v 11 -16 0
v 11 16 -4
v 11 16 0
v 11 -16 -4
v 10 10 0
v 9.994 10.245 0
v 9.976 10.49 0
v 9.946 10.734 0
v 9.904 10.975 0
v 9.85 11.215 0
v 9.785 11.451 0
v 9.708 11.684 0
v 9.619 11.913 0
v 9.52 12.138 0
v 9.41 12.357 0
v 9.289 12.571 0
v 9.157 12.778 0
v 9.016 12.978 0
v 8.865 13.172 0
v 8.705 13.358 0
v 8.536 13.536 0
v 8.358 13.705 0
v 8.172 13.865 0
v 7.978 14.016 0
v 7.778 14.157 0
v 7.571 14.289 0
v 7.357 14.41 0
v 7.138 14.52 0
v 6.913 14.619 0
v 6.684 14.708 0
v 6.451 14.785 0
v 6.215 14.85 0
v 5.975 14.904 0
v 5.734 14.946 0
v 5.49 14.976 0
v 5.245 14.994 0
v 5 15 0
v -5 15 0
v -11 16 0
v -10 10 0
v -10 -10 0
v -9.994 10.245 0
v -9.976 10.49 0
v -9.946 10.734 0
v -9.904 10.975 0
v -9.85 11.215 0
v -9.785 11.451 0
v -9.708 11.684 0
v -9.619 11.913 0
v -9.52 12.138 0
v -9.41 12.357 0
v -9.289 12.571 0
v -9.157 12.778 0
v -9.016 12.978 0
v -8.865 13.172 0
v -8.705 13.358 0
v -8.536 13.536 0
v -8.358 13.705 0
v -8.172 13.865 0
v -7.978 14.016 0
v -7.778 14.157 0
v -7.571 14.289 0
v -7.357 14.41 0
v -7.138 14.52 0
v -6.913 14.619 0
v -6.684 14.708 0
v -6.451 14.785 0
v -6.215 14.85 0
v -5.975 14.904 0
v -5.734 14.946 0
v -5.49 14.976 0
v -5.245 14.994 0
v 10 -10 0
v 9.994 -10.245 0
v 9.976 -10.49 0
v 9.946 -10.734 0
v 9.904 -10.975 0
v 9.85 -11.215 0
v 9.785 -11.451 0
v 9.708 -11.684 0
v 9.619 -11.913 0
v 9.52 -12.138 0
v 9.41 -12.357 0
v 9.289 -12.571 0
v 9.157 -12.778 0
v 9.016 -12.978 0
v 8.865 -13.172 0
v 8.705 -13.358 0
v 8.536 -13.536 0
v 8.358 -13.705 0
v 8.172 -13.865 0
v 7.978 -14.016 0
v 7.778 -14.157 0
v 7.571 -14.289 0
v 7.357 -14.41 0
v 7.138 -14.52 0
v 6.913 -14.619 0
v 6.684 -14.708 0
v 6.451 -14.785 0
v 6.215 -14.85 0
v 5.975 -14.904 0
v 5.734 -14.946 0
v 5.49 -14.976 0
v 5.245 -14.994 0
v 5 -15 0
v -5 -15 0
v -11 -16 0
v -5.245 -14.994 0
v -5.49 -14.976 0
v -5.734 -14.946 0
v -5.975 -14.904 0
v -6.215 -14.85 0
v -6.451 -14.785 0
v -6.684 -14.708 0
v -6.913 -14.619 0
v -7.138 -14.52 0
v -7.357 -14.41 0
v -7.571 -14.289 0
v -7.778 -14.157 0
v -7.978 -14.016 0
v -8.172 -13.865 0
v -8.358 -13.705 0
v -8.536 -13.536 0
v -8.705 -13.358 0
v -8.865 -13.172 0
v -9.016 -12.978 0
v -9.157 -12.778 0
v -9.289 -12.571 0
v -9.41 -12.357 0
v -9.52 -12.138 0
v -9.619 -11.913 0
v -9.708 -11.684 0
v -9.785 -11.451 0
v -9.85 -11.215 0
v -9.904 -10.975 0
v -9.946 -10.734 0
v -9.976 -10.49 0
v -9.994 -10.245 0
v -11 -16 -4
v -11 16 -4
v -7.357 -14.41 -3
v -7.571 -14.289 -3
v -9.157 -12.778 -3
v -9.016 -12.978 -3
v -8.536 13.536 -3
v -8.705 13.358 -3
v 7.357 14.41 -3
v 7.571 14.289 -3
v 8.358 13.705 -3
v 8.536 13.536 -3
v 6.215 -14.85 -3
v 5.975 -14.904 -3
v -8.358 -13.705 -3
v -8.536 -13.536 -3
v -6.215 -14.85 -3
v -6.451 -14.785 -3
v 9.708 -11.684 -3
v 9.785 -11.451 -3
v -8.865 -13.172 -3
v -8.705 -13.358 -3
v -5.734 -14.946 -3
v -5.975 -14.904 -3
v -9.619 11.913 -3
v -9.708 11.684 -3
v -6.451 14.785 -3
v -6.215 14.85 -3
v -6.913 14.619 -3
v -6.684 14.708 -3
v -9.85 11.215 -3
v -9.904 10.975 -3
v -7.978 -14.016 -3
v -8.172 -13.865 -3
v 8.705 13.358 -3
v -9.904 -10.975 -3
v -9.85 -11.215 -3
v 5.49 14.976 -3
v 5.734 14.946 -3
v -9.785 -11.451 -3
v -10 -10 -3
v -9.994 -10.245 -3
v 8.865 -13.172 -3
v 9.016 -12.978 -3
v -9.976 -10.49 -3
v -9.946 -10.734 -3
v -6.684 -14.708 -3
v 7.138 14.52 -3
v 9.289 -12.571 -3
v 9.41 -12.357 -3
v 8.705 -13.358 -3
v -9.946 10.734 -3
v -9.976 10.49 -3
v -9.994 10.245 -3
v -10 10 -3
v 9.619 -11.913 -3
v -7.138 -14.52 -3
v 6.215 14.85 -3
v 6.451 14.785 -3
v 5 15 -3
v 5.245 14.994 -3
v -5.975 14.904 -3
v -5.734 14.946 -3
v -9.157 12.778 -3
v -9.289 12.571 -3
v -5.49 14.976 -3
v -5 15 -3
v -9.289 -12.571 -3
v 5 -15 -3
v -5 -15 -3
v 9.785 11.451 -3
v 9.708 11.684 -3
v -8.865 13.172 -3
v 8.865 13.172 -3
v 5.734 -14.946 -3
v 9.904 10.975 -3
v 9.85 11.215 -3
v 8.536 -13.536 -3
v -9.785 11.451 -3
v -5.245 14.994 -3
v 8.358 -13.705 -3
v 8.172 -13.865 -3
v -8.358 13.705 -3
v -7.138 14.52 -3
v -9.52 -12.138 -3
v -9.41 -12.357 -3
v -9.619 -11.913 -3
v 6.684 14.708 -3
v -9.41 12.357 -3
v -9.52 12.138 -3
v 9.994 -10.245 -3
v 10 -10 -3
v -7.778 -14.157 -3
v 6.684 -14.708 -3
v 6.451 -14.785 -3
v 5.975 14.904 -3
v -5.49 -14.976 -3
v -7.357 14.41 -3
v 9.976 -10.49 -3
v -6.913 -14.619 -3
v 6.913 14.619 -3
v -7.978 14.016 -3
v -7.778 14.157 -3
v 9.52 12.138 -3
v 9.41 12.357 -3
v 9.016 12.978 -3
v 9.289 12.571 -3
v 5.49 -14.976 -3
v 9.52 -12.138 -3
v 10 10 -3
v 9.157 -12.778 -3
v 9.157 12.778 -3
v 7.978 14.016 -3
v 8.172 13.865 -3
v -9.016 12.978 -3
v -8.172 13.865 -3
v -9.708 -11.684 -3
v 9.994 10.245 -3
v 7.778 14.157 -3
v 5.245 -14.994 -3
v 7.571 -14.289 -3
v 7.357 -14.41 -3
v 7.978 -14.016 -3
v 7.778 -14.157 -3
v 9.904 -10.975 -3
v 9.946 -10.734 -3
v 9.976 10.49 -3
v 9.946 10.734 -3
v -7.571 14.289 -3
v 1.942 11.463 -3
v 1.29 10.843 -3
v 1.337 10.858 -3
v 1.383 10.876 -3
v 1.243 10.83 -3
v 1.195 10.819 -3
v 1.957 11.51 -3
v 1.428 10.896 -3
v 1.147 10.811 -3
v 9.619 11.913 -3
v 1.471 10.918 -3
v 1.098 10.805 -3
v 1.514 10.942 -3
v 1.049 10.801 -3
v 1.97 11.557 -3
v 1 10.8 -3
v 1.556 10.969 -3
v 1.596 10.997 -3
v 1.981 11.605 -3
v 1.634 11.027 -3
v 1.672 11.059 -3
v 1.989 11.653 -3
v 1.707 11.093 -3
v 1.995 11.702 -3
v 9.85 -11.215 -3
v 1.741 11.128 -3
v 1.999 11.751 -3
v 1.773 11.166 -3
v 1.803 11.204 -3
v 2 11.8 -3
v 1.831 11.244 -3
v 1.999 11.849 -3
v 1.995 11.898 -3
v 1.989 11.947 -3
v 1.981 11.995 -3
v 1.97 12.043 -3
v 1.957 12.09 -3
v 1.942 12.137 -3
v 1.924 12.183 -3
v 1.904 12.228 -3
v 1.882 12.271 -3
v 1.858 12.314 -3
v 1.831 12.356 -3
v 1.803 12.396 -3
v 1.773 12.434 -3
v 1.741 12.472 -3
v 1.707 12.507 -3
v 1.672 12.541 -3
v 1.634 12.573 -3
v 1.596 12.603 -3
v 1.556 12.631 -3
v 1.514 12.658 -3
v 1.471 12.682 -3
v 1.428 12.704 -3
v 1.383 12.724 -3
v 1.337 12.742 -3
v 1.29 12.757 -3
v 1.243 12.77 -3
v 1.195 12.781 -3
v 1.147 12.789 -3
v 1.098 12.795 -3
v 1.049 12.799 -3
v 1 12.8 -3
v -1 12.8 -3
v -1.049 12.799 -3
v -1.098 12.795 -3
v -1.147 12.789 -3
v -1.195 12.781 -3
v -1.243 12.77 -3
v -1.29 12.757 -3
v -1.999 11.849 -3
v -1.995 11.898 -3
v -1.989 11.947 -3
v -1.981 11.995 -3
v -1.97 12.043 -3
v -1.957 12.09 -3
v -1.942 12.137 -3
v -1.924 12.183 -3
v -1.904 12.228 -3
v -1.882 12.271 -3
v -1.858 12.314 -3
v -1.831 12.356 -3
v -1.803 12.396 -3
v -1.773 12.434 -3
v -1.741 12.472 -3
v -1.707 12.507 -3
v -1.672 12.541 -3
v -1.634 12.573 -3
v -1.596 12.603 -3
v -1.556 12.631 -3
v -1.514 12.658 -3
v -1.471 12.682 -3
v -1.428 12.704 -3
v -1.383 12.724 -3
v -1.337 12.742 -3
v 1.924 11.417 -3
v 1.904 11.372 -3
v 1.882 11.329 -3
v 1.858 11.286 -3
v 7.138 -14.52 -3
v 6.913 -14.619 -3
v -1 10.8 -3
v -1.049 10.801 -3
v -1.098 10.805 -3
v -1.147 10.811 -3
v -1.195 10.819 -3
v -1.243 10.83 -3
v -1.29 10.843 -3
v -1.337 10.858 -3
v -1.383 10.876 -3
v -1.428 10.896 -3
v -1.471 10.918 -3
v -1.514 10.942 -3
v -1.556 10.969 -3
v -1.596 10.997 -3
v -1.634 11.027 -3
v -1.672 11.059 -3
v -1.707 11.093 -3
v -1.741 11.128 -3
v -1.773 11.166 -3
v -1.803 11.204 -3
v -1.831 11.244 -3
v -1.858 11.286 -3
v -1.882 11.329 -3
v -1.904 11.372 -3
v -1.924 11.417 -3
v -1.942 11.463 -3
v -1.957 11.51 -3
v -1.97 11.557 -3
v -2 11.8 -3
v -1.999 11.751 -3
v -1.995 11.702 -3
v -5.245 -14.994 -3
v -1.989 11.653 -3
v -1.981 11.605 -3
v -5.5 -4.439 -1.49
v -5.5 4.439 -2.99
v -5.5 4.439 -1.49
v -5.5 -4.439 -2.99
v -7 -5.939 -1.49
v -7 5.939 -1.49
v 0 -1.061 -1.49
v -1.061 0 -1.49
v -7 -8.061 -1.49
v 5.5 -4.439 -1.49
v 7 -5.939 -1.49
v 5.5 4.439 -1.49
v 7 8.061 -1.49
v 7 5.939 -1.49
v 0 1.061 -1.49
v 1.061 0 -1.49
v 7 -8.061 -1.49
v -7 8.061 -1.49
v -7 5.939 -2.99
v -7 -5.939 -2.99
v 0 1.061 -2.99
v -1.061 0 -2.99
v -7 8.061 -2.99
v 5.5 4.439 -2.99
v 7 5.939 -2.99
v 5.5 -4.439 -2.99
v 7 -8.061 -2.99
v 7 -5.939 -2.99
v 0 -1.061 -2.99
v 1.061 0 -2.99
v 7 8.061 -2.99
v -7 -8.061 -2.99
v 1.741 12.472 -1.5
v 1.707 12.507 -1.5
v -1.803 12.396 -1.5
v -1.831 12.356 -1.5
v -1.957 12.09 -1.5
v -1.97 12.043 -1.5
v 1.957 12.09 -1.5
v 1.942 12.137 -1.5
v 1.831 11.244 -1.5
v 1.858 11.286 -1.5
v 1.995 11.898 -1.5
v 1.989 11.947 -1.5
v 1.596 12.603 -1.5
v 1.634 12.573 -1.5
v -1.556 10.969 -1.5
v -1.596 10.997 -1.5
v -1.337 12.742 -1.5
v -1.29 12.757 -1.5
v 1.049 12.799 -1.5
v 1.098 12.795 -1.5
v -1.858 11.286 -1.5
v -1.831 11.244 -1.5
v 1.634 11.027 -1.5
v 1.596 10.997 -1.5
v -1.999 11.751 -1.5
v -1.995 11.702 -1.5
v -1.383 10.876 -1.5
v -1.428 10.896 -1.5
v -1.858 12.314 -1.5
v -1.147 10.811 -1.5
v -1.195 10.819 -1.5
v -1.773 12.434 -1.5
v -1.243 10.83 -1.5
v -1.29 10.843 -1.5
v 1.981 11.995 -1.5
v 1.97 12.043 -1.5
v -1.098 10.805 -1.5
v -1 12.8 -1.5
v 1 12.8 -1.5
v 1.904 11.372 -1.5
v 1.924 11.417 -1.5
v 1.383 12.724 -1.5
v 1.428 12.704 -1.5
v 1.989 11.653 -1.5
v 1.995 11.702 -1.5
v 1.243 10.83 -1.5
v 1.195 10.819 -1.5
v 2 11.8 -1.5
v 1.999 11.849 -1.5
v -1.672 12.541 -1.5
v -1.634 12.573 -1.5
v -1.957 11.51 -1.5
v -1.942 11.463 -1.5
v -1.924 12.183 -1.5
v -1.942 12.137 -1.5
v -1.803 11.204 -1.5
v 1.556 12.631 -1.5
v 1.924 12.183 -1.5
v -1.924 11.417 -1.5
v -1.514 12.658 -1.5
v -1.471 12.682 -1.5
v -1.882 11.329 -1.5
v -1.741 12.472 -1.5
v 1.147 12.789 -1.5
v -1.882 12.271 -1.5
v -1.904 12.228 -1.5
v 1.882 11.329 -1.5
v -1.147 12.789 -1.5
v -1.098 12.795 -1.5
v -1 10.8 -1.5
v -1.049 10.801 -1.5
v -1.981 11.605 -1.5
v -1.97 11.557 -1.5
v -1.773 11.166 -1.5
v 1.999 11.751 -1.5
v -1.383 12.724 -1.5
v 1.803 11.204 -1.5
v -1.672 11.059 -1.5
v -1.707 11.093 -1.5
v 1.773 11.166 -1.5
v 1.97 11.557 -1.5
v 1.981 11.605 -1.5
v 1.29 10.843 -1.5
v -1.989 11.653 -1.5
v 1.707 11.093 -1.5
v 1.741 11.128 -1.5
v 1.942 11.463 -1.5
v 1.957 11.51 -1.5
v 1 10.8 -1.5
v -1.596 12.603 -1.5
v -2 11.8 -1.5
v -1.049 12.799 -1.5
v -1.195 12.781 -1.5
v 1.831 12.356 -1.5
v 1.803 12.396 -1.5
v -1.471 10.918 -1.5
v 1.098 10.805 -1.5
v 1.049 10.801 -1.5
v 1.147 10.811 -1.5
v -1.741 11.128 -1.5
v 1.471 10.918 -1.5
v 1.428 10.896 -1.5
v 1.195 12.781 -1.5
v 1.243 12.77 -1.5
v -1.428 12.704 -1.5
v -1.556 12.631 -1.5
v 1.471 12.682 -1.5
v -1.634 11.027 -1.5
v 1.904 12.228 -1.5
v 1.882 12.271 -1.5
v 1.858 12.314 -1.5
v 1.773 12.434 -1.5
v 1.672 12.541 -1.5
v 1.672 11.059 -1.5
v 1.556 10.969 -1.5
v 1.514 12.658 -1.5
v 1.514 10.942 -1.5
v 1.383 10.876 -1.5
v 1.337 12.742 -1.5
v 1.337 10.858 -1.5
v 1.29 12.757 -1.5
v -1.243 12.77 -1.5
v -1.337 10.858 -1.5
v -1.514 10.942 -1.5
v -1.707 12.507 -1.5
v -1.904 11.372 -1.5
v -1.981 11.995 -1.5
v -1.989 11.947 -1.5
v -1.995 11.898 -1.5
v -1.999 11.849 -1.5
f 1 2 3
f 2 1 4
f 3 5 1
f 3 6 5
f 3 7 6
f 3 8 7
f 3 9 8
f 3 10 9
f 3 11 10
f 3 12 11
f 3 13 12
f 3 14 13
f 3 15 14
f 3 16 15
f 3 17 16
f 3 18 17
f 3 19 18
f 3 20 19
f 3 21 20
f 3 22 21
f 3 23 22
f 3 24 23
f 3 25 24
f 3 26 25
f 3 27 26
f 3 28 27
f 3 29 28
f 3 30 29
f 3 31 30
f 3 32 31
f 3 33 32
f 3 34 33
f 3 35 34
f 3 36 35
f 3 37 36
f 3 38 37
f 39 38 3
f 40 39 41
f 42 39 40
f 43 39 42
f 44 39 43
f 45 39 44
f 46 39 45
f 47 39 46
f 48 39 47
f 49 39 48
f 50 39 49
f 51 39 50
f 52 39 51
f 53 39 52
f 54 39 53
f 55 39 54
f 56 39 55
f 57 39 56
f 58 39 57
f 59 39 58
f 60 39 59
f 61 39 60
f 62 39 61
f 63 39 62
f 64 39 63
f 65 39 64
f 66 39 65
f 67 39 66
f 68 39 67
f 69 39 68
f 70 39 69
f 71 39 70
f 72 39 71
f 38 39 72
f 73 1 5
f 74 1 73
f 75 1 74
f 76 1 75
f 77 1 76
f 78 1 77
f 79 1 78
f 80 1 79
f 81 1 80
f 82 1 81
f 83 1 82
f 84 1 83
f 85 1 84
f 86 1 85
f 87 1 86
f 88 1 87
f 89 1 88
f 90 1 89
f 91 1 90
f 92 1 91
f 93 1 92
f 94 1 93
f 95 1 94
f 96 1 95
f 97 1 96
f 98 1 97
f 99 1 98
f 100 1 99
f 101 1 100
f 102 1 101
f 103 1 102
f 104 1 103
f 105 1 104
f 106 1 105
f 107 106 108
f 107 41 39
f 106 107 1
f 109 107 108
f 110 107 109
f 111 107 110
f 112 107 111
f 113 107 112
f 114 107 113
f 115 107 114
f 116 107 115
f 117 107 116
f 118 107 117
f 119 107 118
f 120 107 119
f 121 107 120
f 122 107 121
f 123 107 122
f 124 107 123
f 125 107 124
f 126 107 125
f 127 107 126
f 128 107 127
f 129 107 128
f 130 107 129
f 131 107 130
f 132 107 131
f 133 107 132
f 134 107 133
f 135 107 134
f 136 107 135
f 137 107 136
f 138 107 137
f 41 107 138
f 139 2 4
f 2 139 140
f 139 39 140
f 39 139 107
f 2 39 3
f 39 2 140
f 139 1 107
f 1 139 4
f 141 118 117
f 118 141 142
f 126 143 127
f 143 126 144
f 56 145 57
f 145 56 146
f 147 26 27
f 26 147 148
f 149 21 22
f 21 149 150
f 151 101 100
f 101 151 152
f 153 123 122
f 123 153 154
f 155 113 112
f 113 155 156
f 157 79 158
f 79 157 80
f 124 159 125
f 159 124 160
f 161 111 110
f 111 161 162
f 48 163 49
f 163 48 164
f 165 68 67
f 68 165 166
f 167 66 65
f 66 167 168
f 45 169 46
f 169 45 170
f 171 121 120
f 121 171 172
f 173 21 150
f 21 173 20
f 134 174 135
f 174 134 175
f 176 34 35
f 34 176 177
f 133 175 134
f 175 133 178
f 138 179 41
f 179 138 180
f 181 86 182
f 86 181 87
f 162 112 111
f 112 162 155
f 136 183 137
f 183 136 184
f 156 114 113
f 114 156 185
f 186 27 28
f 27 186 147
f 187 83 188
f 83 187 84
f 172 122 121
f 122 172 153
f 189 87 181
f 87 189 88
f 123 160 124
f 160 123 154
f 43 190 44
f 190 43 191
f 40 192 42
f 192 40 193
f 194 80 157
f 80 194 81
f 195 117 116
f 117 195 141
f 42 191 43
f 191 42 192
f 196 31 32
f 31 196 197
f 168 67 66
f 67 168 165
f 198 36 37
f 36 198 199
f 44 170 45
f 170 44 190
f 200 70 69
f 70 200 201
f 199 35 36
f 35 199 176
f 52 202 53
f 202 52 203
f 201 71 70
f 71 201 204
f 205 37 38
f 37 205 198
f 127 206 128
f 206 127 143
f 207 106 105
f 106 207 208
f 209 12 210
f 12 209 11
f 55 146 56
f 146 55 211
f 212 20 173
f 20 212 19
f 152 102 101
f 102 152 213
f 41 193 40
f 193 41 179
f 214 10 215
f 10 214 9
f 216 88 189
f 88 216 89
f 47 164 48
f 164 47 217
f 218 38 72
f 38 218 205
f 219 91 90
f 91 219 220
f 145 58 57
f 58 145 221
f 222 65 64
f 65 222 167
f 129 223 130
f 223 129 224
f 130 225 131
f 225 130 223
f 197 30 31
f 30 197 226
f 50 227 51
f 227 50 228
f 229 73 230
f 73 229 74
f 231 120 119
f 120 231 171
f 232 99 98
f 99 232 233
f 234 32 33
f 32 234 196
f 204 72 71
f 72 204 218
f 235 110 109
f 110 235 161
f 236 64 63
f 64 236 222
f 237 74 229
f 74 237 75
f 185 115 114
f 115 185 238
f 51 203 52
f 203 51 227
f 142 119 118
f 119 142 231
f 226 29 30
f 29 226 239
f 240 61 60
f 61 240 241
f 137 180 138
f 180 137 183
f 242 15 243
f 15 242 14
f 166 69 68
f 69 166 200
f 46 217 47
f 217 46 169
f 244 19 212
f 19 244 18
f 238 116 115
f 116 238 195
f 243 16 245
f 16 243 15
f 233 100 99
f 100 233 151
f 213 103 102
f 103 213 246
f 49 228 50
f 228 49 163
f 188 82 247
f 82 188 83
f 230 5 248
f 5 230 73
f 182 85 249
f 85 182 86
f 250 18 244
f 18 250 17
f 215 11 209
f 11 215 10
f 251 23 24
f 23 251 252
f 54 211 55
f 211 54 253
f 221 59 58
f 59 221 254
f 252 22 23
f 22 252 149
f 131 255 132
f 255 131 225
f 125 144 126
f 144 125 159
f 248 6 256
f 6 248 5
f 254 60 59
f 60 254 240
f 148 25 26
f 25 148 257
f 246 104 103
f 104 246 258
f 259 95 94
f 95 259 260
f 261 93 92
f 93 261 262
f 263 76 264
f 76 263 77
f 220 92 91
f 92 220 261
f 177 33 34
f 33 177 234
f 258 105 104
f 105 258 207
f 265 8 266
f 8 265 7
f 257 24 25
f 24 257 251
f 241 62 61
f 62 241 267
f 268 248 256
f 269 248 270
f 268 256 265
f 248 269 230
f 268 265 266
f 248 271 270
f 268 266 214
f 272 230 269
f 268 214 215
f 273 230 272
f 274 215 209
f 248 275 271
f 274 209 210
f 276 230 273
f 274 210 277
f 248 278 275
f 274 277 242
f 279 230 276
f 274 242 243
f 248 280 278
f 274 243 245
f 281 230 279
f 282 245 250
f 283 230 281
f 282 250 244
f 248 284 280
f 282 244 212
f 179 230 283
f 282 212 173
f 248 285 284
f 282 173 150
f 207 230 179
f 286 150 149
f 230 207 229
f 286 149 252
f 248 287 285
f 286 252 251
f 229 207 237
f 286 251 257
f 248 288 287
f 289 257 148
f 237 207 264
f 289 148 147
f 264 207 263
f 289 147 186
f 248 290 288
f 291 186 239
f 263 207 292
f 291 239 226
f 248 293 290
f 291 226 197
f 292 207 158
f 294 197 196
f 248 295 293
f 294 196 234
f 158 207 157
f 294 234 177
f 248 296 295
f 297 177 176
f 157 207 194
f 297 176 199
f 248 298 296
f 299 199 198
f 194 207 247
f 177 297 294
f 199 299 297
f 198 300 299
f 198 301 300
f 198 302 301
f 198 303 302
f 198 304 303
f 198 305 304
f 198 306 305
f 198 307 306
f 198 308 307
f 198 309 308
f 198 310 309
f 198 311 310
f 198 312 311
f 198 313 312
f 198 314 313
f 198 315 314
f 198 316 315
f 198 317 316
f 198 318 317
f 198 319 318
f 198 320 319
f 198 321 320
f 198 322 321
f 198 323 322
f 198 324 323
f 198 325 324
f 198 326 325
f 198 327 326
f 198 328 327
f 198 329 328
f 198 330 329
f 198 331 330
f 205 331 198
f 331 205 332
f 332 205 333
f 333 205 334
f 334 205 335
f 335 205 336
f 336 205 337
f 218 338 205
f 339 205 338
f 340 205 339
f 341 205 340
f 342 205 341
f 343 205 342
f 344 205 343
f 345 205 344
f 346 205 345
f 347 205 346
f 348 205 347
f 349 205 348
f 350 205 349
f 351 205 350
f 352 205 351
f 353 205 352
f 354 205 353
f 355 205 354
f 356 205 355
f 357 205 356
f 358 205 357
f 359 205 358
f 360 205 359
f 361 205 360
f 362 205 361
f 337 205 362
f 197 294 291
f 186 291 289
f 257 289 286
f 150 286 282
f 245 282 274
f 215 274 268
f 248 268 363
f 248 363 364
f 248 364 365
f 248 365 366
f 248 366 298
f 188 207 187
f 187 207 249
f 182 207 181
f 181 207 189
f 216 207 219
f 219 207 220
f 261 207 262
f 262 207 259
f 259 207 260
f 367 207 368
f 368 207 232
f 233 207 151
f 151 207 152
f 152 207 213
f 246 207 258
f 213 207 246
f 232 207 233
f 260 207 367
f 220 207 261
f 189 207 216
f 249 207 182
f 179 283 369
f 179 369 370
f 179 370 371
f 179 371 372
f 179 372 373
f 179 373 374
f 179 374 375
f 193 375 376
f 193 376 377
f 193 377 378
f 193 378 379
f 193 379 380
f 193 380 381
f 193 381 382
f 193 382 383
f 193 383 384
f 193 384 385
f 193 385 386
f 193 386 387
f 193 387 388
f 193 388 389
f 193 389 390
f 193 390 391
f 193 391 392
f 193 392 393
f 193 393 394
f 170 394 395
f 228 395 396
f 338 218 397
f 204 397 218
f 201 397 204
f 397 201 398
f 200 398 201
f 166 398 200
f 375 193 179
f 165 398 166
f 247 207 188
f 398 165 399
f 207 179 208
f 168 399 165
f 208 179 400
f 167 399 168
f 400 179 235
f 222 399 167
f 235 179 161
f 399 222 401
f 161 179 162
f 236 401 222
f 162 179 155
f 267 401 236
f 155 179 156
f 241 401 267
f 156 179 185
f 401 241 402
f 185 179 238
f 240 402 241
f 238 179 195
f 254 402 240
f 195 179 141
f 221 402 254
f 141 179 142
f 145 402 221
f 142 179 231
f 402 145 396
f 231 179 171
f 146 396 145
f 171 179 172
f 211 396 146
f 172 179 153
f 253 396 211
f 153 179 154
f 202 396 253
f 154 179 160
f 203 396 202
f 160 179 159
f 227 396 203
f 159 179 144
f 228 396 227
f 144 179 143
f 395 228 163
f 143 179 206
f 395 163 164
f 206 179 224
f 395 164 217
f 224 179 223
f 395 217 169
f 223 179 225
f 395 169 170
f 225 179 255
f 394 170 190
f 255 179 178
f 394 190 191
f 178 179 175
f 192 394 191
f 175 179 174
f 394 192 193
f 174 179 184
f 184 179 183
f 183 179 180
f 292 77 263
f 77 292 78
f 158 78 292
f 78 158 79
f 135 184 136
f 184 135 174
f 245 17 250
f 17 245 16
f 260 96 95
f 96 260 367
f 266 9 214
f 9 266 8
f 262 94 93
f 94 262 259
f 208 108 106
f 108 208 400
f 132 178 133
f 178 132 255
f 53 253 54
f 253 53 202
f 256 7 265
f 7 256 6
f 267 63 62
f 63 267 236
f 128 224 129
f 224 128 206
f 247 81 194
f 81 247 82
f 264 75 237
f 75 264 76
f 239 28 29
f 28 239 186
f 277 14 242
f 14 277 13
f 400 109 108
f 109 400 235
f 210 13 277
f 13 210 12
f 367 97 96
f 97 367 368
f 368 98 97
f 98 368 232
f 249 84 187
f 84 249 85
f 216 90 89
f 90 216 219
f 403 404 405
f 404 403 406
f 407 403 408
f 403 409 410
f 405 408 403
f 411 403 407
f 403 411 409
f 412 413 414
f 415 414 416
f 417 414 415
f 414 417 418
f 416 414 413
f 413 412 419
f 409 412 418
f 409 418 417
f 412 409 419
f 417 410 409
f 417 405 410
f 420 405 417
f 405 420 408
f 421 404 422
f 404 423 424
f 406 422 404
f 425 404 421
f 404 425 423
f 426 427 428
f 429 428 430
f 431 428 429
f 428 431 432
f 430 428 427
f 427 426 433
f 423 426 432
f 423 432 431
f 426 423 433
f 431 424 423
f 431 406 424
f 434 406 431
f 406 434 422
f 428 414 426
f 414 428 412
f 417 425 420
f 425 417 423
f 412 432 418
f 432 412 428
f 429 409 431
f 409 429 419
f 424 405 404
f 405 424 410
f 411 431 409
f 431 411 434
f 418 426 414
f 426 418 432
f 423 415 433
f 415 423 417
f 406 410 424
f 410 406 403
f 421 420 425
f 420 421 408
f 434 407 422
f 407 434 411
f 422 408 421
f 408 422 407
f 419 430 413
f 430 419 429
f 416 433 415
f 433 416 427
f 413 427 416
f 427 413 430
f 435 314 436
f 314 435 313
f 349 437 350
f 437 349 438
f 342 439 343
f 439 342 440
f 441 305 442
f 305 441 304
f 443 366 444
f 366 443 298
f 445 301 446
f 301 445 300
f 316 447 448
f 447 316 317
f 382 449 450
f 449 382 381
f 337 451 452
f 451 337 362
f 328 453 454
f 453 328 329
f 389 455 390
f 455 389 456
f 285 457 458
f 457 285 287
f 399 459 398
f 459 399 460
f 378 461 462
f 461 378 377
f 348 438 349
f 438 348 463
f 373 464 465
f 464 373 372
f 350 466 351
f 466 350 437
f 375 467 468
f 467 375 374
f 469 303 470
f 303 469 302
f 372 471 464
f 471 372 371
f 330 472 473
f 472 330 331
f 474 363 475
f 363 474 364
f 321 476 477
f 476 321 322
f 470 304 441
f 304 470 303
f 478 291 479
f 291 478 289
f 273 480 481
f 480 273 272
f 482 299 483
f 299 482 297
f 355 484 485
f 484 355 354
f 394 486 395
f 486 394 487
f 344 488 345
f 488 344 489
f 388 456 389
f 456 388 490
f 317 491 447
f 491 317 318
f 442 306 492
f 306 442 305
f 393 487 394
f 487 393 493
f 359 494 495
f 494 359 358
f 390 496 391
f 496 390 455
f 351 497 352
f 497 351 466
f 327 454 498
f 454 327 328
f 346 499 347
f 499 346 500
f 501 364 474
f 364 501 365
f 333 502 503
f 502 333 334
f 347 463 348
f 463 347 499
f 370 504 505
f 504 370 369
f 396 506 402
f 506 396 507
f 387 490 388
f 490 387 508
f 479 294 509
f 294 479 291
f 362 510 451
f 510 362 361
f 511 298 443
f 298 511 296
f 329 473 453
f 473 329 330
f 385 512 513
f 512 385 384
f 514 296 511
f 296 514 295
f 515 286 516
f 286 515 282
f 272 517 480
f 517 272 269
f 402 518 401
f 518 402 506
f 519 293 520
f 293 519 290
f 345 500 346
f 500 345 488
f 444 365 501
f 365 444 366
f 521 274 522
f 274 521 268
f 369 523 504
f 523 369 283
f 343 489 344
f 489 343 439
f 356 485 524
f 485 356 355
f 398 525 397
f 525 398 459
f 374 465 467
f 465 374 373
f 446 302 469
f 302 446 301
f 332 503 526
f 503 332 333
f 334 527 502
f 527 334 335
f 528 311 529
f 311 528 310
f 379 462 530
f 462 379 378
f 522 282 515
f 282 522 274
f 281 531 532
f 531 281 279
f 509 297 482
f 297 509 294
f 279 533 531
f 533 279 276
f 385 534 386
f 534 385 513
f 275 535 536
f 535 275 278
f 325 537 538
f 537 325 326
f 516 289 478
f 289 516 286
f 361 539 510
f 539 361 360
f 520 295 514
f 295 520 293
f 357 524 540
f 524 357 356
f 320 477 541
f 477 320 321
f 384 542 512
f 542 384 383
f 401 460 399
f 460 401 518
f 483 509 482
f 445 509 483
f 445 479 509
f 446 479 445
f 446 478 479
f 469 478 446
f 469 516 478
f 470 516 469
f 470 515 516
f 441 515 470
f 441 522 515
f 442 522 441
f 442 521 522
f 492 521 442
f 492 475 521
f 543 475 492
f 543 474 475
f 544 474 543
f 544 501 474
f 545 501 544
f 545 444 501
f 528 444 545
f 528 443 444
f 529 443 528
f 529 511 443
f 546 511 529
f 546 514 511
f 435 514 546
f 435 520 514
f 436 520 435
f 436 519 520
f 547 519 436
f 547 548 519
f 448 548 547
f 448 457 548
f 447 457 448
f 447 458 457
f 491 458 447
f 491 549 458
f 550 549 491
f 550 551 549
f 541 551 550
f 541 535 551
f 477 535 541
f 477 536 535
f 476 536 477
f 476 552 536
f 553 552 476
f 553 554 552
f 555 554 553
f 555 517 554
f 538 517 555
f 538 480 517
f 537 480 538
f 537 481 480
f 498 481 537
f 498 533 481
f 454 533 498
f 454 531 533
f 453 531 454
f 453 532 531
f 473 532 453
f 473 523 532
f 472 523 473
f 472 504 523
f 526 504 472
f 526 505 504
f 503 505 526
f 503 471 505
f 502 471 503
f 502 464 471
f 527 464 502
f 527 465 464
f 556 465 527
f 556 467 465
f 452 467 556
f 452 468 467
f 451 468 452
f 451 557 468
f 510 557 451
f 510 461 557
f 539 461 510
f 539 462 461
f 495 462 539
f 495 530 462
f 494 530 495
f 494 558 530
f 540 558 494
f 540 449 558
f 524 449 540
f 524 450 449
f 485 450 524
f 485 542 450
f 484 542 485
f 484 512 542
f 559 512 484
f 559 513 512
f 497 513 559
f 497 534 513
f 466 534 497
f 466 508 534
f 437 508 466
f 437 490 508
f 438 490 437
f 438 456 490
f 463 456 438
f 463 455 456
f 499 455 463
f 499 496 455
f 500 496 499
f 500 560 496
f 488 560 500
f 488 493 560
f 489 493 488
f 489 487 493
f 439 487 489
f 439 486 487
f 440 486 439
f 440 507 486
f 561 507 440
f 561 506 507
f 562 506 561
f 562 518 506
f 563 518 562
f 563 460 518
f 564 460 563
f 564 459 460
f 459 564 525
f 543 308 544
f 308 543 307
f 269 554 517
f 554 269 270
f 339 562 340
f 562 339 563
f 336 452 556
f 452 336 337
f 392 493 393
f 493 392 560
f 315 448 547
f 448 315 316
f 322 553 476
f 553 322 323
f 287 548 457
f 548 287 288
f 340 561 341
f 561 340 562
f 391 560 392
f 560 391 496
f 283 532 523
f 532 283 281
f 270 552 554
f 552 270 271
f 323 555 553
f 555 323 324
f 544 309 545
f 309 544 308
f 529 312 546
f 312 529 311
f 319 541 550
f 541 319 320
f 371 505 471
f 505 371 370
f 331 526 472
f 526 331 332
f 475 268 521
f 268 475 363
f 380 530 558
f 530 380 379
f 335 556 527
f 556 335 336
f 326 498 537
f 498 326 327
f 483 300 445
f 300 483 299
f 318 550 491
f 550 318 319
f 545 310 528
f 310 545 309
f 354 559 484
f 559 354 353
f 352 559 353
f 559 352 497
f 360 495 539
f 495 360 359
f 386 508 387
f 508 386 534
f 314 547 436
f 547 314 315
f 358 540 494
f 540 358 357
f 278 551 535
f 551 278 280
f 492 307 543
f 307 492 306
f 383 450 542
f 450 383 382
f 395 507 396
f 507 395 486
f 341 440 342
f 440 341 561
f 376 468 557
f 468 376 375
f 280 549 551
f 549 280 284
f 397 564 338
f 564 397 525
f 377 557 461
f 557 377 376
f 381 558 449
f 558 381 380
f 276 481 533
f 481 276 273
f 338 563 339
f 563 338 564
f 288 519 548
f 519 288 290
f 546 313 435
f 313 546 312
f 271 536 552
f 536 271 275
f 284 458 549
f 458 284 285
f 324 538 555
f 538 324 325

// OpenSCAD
/******************************************************************************!
 * \file runeDagaz.scad
 * \author Sebastien Beaugrand
 * \sa http://beaugrand.chez.com/
 * \copyright CeCILL 2.1 Free Software license
 * \note sudo apt install openscad-mcad
 *
 *       *dagaz emblematiserait une capacite' a eliminer toute chose ne
 *       s'integrant pas dans une vision du monde reconduisant au "principe" et,
 *       consequemment, au "Centre supreme", le lieu fondateur du developpement
 *       civilisationnel."
 *       (Paul-Georges Sansonetti, La Cathedrale Polaire des Runes, ACE, p. 28)
 ******************************************************************************/
T=2;     // Diametre de l'outil
L=20;    // Longueur du support
P=30;    // Profondeur du support
H=3;     // Hauteur du support
M=1;     // Marge au bord
l=14;    // Longueur de la rune
p=1.5;   // Profondeur des segments
e=1.5;   // Epaisseur des segments
m=0.01;  // Marge pour les differences
s=sqrt(2)/2;
$fn=128;

difference() {
  translate([0,0,-(H+M)/2]) cube([L+M*2,P+M*2,H+M],center=true);
  translate([0,0,-H]) hull() {
    r=5;
    x=L/2-r;
    y=P/2-r;
    translate([-x,-y,0]) cylinder(H+m,r=r);
    translate([-x, y,0]) cylinder(H+m,r=r);
    translate([ x, y,0]) cylinder(H+m,r=r);
    translate([ x,-y,0]) cylinder(H+m,r=r);
  }
}

translate([0,0,-H+e/2+m]) difference() {
  h=l+p/s;
  echo("h = ", h);
  union() {
    translate([-l/2+p/2-m,0,0]) cube([p+m*2,h-p/s*2,e],center=true);
    translate([ l/2-p/2+m,0,0]) cube([p+m*2,h-p/s*2,e],center=true);
    rotate([0,0, 45]) cube([p,l/s+p,e],center=true);
    rotate([0,0,-45]) cube([p,l/s+p,e],center=true);
  }
  translate([-l/2-p/2,0,0]) cube([p,h,e+m],center=true);
  translate([ l/2+p/2,0,0]) cube([p,h,e+m],center=true);
}

module oblong(s) {
  hull() {
    r=1;
    l=2;
    translate([-l/2,(P/2-r-T-0.2)*s,-H]) cylinder(e,r=r);
    translate([ l/2,(P/2-r-T-0.2)*s,-H]) cylinder(e,r=r);
  }
}
oblong( 1);
//oblong(-1);
